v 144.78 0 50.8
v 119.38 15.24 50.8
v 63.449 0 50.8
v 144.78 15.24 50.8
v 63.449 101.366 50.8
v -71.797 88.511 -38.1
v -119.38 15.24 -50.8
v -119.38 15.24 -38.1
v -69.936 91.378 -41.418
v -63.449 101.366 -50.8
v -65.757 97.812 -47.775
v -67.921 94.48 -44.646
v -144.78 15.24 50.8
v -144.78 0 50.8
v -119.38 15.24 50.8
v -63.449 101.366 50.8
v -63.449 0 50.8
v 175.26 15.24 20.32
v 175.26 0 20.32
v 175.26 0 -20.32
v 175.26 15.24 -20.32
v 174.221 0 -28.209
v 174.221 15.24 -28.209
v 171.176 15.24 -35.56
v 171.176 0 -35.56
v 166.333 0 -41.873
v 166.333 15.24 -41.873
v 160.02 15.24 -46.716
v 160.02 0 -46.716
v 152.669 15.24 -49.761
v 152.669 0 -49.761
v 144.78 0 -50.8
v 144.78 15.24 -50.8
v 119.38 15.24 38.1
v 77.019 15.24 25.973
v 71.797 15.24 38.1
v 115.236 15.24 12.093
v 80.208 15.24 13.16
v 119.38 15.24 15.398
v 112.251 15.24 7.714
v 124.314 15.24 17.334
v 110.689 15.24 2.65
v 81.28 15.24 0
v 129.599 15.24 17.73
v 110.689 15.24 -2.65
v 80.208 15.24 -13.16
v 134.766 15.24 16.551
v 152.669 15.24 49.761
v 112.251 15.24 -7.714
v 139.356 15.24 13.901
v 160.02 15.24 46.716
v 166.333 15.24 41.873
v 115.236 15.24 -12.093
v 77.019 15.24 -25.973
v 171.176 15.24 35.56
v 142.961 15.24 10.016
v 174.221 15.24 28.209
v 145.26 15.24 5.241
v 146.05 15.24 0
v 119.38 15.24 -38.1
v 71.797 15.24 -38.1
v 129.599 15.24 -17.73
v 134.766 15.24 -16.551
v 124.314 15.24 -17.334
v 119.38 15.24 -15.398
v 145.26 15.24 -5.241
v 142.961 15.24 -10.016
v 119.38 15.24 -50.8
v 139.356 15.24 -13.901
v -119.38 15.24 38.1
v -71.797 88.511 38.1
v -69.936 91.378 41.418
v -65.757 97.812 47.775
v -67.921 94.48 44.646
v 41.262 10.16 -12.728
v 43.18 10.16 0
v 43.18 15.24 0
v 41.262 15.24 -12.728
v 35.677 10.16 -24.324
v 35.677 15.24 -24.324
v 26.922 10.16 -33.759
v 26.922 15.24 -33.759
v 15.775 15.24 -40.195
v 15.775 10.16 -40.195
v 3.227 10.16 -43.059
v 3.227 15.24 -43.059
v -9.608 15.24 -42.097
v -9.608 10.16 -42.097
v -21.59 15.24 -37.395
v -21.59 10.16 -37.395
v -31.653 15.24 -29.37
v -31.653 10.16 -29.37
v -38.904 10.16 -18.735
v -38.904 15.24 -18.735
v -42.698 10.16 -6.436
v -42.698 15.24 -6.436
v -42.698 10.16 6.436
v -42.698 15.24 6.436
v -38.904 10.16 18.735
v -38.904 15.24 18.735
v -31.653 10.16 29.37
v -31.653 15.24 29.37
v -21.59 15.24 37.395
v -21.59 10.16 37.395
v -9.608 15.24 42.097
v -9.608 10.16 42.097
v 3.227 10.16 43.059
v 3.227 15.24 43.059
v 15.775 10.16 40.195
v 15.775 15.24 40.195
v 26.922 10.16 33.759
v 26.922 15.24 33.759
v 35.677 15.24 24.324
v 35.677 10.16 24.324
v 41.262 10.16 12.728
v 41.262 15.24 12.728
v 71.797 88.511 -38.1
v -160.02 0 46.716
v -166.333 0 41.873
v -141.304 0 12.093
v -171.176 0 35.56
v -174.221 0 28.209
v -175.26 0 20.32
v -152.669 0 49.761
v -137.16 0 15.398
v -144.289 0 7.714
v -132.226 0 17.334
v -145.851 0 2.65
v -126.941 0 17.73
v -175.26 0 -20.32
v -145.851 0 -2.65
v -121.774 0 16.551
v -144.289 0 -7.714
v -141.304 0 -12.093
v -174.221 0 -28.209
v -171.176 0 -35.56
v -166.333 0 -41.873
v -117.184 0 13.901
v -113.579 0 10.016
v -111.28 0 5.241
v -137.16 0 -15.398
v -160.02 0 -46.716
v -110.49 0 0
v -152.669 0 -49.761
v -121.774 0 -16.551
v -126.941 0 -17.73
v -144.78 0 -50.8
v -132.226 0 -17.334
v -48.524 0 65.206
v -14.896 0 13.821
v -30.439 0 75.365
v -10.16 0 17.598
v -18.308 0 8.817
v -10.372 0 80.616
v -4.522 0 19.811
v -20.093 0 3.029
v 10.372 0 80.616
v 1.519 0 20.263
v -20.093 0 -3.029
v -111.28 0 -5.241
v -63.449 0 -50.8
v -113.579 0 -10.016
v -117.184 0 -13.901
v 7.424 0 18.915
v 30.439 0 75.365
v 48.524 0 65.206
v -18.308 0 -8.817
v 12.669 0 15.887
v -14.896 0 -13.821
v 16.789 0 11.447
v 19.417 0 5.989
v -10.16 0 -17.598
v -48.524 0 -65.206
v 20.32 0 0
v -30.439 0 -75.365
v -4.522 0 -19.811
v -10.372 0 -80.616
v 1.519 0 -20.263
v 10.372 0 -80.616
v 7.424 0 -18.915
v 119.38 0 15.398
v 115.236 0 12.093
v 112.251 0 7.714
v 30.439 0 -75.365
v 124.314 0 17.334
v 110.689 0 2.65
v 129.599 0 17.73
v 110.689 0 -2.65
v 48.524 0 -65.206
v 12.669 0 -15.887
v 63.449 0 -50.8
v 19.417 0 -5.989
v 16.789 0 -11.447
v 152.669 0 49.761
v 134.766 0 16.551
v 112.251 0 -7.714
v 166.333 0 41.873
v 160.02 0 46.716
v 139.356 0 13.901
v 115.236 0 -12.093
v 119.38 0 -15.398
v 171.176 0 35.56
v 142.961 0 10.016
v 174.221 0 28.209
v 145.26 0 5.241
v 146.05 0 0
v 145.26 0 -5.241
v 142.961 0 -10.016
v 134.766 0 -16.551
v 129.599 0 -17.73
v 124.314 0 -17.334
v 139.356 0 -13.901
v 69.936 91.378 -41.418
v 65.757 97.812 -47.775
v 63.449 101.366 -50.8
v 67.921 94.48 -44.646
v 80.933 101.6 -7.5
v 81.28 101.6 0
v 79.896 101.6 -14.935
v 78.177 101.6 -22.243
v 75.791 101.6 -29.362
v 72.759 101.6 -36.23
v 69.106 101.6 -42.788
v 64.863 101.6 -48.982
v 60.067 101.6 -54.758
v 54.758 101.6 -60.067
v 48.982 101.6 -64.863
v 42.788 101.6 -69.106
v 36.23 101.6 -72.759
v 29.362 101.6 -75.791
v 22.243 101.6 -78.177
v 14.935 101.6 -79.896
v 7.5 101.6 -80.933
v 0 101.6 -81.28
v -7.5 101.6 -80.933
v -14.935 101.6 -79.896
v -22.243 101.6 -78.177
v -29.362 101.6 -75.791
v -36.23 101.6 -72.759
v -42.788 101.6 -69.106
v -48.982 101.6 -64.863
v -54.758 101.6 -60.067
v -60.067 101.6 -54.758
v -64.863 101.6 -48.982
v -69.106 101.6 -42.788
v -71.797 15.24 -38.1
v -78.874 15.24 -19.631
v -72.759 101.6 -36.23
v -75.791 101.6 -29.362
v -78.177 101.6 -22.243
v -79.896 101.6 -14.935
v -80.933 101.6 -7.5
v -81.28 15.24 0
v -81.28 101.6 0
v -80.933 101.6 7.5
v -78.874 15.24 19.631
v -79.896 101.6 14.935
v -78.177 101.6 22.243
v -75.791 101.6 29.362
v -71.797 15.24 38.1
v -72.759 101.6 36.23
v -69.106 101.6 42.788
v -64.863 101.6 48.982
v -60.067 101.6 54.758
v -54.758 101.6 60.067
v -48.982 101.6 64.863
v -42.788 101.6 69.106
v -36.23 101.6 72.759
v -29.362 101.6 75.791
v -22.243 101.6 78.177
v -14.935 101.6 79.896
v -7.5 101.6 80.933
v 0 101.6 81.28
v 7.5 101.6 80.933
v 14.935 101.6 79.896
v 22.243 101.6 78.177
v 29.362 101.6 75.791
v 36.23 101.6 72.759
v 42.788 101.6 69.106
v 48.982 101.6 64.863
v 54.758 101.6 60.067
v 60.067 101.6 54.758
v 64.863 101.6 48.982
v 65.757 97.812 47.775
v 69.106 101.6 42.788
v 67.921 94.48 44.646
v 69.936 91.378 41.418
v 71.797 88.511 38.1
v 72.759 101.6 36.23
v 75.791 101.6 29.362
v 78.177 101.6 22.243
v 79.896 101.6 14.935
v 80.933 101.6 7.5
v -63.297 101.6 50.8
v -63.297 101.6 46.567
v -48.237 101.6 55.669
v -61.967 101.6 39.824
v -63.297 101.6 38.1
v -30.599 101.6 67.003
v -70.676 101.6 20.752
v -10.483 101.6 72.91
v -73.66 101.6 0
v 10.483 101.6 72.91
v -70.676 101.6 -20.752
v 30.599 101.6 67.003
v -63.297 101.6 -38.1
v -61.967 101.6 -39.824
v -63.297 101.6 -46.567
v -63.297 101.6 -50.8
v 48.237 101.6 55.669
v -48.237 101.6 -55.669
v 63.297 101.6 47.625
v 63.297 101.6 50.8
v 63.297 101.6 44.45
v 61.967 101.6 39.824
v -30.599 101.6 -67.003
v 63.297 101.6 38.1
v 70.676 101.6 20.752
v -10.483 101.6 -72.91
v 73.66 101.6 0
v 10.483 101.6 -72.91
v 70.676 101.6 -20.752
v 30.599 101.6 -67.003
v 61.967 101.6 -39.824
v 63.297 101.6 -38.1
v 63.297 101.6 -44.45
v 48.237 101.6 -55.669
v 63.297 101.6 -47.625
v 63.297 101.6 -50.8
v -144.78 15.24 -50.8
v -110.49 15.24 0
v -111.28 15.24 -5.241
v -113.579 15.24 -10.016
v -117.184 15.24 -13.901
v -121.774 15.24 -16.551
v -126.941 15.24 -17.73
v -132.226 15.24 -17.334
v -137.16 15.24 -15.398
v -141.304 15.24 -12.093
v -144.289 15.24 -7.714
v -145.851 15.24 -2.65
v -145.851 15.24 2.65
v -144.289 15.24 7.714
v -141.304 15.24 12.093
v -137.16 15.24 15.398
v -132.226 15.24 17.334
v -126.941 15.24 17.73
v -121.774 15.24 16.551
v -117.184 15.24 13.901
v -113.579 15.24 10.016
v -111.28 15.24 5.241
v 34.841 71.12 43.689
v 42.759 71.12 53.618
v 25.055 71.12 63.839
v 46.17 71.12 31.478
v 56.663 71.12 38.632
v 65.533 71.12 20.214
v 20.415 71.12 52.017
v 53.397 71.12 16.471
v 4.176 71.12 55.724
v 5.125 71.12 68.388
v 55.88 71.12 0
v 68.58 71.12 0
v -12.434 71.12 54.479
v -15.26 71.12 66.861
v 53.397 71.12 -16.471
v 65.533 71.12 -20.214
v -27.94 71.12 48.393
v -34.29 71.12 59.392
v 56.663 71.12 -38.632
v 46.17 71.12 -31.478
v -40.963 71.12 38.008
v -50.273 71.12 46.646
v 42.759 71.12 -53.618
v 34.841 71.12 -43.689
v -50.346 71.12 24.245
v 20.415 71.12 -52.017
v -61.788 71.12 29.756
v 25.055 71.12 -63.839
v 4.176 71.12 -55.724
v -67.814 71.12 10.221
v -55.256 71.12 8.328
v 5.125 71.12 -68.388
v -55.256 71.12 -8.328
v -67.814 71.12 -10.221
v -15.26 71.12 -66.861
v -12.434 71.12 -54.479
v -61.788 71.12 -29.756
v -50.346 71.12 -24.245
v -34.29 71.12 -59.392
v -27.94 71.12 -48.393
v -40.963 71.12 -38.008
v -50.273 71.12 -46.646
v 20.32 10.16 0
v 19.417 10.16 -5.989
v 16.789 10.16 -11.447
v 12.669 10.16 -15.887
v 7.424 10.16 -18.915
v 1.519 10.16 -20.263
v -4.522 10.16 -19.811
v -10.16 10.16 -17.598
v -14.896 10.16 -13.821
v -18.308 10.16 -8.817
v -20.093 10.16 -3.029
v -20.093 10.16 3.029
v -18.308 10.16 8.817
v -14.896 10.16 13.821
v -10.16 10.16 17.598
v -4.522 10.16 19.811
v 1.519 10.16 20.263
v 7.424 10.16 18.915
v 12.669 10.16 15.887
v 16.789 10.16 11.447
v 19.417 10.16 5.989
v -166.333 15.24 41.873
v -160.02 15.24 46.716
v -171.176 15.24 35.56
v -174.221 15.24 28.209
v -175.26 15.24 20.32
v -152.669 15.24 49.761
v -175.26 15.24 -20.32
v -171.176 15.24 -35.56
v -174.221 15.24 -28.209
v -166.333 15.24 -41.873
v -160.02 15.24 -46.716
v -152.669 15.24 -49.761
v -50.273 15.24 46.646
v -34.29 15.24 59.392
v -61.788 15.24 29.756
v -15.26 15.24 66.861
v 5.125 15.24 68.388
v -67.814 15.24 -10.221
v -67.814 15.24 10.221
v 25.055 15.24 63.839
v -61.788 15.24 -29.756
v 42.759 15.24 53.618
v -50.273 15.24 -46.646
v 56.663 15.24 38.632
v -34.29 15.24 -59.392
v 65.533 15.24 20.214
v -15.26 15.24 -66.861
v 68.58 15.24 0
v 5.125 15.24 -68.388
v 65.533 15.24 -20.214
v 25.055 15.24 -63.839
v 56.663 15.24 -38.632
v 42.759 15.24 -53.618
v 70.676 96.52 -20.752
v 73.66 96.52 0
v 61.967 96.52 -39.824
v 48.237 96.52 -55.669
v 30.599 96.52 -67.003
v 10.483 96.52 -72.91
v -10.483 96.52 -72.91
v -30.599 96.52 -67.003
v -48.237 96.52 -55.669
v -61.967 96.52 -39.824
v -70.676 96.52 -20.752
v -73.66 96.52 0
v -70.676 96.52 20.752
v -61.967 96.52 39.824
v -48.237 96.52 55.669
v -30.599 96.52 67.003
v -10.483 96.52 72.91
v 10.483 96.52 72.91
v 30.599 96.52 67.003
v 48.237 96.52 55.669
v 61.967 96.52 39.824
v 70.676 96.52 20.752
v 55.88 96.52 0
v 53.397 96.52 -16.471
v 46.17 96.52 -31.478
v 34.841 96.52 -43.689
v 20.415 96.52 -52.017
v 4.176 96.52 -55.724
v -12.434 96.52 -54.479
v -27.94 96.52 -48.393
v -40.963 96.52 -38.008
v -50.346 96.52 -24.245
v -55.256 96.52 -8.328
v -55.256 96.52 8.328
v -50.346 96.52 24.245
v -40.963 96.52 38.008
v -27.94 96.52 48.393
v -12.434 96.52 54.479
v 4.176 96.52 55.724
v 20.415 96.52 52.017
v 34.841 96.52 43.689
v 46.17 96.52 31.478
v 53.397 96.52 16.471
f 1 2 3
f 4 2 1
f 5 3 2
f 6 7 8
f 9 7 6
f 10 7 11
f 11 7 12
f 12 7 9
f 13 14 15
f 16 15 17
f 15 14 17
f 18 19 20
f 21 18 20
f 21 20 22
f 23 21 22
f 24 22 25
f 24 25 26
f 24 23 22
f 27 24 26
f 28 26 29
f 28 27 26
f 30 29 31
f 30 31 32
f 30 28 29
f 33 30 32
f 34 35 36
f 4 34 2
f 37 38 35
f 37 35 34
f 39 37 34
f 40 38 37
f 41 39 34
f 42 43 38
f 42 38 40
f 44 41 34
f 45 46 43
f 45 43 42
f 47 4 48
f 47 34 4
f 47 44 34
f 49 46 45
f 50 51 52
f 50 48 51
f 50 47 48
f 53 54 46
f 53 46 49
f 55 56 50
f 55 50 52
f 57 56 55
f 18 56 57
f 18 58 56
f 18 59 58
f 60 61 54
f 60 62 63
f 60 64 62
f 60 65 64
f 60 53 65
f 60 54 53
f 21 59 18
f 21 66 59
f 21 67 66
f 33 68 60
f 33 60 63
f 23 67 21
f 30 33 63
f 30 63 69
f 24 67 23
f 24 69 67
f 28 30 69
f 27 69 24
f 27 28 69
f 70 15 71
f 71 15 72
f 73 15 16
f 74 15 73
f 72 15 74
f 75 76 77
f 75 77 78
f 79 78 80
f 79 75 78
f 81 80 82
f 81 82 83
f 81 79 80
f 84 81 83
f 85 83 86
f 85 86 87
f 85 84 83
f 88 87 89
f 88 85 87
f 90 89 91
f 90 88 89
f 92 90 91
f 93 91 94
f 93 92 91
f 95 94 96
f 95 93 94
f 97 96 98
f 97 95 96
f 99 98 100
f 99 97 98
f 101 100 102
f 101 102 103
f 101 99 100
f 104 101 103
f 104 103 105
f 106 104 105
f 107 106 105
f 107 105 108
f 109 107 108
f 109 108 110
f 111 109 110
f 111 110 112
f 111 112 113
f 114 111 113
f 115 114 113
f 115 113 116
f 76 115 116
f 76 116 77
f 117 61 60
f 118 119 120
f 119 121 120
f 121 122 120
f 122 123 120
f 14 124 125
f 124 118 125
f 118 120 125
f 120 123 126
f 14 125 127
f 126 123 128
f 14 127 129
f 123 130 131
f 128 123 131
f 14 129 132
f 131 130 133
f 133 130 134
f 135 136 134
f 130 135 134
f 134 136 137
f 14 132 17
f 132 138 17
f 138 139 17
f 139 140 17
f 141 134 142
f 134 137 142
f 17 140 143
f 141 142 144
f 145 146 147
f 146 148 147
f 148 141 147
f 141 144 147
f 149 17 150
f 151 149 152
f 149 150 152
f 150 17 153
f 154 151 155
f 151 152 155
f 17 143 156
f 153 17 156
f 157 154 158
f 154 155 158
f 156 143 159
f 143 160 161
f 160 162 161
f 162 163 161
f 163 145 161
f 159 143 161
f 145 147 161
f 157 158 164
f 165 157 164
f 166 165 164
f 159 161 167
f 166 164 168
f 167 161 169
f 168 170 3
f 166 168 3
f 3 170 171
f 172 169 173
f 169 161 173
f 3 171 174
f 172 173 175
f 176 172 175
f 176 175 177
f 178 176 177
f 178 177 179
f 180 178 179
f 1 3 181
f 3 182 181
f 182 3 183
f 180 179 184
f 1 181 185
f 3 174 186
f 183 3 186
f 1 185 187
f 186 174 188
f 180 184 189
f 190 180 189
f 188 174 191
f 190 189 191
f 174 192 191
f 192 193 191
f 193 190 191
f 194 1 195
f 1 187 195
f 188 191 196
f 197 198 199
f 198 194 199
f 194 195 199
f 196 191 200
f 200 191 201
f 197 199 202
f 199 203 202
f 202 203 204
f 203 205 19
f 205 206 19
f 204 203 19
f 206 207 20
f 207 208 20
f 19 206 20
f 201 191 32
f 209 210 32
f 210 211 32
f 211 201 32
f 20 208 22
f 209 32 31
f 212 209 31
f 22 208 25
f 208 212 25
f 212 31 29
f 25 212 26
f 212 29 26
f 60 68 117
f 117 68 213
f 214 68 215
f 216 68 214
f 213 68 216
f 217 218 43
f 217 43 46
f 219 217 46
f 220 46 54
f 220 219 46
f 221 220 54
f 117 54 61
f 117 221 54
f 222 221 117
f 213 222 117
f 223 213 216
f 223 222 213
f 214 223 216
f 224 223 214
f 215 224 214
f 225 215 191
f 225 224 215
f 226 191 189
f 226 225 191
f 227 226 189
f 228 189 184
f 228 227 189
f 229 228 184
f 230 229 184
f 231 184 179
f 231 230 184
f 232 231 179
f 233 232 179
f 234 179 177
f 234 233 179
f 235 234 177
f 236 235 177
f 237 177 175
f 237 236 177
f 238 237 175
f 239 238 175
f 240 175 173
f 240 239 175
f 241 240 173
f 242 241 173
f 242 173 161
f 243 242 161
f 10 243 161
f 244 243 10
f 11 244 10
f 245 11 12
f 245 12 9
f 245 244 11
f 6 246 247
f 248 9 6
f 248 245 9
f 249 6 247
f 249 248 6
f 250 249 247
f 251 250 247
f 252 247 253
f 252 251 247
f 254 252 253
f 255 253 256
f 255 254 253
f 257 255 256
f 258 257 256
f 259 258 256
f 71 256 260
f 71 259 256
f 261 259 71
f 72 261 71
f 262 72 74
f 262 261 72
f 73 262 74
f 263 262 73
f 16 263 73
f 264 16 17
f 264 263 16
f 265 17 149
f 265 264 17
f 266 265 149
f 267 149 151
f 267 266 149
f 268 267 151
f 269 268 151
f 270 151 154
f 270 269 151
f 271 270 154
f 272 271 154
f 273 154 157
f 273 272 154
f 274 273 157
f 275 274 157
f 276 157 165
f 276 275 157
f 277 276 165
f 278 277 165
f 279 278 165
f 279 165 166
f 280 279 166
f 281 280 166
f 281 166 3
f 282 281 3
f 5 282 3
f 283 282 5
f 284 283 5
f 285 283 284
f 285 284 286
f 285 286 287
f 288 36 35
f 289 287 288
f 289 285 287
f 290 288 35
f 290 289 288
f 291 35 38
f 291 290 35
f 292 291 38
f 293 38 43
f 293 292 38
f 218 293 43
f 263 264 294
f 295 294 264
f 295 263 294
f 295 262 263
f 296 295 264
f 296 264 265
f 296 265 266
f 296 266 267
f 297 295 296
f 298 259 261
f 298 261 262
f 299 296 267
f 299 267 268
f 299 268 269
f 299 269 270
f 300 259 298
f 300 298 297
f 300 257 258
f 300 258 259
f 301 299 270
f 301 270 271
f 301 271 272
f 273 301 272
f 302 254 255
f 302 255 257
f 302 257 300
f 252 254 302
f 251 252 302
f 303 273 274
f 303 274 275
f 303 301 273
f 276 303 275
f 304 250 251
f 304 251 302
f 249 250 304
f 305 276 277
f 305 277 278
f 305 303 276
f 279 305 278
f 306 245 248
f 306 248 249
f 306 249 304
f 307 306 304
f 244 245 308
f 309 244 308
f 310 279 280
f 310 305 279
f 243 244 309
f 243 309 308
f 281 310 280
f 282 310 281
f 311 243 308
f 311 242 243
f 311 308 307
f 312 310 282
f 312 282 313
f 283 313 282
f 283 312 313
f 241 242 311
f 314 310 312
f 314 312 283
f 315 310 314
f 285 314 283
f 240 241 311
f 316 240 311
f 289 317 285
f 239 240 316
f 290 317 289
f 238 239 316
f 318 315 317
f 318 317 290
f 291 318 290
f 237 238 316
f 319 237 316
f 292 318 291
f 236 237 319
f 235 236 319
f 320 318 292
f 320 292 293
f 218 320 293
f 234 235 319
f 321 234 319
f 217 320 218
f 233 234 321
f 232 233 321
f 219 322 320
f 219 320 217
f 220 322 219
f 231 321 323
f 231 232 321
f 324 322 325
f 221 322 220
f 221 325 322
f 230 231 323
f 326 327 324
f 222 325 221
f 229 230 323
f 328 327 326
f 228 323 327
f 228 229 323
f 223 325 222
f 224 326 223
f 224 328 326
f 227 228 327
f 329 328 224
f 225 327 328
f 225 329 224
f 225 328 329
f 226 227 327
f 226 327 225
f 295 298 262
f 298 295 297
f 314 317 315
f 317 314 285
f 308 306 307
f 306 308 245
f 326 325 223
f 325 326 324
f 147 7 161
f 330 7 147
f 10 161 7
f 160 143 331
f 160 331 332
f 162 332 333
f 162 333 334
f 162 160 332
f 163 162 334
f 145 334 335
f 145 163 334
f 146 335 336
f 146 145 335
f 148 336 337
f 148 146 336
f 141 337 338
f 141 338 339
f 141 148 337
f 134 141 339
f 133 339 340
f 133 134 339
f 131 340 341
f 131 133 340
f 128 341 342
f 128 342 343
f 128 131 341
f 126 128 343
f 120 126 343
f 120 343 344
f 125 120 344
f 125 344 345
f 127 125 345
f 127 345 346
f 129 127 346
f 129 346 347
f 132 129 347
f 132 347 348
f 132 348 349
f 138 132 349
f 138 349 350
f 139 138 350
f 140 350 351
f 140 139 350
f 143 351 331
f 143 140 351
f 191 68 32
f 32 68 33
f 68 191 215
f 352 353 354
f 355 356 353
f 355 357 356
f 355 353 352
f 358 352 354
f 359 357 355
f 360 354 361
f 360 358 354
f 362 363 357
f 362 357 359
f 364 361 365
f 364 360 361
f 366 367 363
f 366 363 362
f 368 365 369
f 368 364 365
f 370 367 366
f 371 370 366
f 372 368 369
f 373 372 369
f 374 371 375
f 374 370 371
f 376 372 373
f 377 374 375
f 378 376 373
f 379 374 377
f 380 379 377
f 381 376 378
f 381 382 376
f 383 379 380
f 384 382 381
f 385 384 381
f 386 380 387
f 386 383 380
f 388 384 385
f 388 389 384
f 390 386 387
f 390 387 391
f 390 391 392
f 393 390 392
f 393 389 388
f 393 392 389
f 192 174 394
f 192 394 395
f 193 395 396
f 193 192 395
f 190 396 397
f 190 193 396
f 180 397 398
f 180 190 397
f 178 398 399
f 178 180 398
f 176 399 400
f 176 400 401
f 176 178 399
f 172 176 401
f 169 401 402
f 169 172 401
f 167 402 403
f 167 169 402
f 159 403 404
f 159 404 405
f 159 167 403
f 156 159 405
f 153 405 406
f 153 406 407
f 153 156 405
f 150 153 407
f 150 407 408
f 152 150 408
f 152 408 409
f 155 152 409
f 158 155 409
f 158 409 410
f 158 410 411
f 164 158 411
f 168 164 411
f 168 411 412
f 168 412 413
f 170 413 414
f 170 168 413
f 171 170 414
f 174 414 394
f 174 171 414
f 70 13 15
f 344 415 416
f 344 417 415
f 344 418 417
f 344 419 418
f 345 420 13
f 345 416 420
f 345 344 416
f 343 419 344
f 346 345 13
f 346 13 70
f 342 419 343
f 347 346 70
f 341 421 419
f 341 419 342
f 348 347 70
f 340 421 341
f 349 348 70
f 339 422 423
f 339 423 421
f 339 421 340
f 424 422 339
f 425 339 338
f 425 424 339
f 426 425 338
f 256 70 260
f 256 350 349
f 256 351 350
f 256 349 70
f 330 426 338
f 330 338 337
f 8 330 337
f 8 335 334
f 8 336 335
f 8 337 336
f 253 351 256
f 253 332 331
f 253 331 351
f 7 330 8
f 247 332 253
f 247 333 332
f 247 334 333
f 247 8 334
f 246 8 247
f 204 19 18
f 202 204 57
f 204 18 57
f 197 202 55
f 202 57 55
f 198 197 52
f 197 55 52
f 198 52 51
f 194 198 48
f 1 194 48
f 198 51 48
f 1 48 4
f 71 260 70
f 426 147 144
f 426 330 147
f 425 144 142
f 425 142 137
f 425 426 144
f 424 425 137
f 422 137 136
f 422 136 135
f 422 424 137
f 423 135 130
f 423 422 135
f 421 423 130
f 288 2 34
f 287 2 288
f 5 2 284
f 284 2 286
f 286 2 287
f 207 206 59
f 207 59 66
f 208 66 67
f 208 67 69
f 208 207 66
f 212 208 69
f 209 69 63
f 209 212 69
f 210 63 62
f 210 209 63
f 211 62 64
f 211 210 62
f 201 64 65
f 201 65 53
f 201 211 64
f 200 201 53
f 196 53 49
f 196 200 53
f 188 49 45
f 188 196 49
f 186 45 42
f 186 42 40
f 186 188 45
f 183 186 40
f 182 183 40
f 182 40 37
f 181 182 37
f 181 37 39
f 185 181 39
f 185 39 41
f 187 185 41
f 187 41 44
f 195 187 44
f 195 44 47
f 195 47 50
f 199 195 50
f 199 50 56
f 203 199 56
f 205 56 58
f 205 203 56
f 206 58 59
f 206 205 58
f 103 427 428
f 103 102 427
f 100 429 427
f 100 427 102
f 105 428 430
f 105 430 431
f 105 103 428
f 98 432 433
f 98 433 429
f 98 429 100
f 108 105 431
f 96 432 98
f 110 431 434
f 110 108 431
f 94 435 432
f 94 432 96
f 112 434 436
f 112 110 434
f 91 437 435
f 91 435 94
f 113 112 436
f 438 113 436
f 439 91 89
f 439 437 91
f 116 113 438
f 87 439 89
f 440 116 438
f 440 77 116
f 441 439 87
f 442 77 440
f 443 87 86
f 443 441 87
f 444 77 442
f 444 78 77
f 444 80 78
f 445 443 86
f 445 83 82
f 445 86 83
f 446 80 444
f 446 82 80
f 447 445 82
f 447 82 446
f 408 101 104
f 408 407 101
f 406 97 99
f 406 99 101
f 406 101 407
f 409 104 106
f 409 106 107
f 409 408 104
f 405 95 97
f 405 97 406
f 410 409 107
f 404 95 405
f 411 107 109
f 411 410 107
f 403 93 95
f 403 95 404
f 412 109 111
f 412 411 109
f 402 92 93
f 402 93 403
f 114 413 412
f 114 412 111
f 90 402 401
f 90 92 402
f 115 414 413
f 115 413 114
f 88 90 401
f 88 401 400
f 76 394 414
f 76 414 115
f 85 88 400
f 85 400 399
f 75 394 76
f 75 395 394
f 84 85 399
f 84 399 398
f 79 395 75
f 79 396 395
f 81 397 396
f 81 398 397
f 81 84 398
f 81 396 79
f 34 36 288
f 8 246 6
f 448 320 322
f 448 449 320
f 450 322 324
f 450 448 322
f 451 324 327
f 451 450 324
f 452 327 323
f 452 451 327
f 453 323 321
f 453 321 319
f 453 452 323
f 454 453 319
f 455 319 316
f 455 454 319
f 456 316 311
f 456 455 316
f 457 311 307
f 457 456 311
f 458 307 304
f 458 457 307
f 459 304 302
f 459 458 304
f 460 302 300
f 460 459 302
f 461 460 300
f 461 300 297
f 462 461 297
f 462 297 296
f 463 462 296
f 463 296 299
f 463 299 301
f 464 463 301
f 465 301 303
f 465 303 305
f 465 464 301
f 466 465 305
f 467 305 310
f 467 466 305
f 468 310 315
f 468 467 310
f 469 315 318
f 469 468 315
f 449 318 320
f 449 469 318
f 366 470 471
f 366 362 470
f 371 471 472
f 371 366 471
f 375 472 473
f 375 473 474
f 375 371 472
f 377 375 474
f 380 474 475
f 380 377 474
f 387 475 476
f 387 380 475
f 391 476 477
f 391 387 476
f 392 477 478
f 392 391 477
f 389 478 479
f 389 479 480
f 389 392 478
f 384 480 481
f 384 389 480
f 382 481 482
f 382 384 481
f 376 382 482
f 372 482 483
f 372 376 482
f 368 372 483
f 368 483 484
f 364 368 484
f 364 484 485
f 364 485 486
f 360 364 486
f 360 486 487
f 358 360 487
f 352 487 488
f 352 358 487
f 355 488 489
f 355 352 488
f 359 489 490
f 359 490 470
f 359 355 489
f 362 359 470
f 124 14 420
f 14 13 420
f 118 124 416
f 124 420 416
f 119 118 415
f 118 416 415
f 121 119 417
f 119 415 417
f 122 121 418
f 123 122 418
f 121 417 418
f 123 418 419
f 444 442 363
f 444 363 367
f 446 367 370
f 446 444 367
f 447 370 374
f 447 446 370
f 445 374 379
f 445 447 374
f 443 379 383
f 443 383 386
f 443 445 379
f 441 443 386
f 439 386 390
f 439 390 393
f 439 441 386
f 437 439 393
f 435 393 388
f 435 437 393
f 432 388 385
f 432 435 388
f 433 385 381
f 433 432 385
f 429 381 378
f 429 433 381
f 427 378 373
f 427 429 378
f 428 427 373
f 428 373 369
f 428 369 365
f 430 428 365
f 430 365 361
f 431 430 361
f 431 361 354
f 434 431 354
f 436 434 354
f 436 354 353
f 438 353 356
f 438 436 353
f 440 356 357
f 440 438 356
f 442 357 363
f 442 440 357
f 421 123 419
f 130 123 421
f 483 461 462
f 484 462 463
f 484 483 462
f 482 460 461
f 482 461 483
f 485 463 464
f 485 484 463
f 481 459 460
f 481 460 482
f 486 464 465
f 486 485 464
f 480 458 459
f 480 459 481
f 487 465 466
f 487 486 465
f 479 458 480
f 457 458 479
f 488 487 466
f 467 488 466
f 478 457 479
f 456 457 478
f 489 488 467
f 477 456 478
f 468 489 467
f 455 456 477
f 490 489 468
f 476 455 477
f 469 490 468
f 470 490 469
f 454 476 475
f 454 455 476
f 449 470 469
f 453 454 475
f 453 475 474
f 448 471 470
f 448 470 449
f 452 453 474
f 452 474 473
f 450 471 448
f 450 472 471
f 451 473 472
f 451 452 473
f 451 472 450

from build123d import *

# Parameters (mm, degrees)
SKETCH2_W           = 350.52
SKETCH2_H           = 101.6
SKETCH2_R           = 43.18
SKETCH2_R_2         = 17.78
BOSS_EXTRUDE1_DEPTH = 15.24
SKETCH2_3_R         = 43.18
SKETCH2_3_R_2       = 20.32
BOSS_EXTRUDE2_DEPTH = 10.16
BOSS_EXTRUDE3_START = -50.8
BOSS_EXTRUDE3_DEPTH = 12.7
BOSS_EXTRUDE4_START = 50.8
BOSS_EXTRUDE4_DEPTH = 12.7
FILLET1_R           = 30.48


with BuildPart() as part:
    # Sketch2 → Boss-Extrude1 (new body)
    with BuildSketch(Plane(origin=(0, 0, 0), x_dir=(1, 0, 0), z_dir=(0, 1, 0))):
        Rectangle(SKETCH2_W, SKETCH2_H)
        Circle(SKETCH2_R, mode=Mode.SUBTRACT)
        with Locations((128.27, 0)):
            Circle(SKETCH2_R_2, mode=Mode.SUBTRACT)
        with Locations((-128.27, 0)):
            Circle(SKETCH2_R_2, mode=Mode.SUBTRACT)
    extrude(amount=BOSS_EXTRUDE1_DEPTH)

    # Sketch2<3> → Boss-Extrude2 (add)
    with BuildSketch(Plane(origin=(0, 0, 0), x_dir=(1, 0, 0), z_dir=(0, 1, 0))):
        Circle(SKETCH2_3_R)
        Circle(SKETCH2_3_R_2, mode=Mode.SUBTRACT)
    extrude(amount=BOSS_EXTRUDE2_DEPTH)

    # Sketch3 → Revolve1 (revolve)
    with BuildSketch(Plane.XY):
        Polygon((43.18, 15.24), (43.18, 0), (81.28, 0), (81.28, 101.6), (73.66, 101.6), (73.66, 96.52), (55.88, 96.52), (55.88, 71.12), (68.58, 71.12), (68.58, 15.24), align=None)
    revolve(axis=Axis((0, 0, 0), (0, 1, 0)))

    # Sketch4 → Boss-Extrude3 (add)
    with BuildSketch(Plane.XY.offset(BOSS_EXTRUDE3_START)):
        Polygon((119.38, 15.24), (63.297160251, 101.6), (63.297160251, 15.24), align=None)
        Polygon((-63.297160251, 15.24), (-119.38, 15.24), (-63.297160251, 101.6), align=None)
    extrude(amount=BOSS_EXTRUDE3_DEPTH)

    # Sketch4<2> → Boss-Extrude4 (add)
    with BuildSketch(Plane.XY.offset(BOSS_EXTRUDE4_START)):
        Polygon((119.38, 15.24), (63.297160251, 101.6), (63.297160251, 15.24), align=None)
        Polygon((-63.297160251, 15.24), (-119.38, 15.24), (-63.297160251, 101.6), align=None)
    extrude(amount=-BOSS_EXTRUDE4_DEPTH)

    # Fillet1
    fillet1_edges = [part.edges().sort_by_distance(p)[0] for p in [
        (-175.26, 7.62, 50.8),
        (-175.26, 7.62, -50.8),
        (175.26, 7.62, -50.8),
        (175.26, 7.62, 50.8),
    ]]
    fillet(fillet1_edges, radius=FILLET1_R)


solid = part.part
